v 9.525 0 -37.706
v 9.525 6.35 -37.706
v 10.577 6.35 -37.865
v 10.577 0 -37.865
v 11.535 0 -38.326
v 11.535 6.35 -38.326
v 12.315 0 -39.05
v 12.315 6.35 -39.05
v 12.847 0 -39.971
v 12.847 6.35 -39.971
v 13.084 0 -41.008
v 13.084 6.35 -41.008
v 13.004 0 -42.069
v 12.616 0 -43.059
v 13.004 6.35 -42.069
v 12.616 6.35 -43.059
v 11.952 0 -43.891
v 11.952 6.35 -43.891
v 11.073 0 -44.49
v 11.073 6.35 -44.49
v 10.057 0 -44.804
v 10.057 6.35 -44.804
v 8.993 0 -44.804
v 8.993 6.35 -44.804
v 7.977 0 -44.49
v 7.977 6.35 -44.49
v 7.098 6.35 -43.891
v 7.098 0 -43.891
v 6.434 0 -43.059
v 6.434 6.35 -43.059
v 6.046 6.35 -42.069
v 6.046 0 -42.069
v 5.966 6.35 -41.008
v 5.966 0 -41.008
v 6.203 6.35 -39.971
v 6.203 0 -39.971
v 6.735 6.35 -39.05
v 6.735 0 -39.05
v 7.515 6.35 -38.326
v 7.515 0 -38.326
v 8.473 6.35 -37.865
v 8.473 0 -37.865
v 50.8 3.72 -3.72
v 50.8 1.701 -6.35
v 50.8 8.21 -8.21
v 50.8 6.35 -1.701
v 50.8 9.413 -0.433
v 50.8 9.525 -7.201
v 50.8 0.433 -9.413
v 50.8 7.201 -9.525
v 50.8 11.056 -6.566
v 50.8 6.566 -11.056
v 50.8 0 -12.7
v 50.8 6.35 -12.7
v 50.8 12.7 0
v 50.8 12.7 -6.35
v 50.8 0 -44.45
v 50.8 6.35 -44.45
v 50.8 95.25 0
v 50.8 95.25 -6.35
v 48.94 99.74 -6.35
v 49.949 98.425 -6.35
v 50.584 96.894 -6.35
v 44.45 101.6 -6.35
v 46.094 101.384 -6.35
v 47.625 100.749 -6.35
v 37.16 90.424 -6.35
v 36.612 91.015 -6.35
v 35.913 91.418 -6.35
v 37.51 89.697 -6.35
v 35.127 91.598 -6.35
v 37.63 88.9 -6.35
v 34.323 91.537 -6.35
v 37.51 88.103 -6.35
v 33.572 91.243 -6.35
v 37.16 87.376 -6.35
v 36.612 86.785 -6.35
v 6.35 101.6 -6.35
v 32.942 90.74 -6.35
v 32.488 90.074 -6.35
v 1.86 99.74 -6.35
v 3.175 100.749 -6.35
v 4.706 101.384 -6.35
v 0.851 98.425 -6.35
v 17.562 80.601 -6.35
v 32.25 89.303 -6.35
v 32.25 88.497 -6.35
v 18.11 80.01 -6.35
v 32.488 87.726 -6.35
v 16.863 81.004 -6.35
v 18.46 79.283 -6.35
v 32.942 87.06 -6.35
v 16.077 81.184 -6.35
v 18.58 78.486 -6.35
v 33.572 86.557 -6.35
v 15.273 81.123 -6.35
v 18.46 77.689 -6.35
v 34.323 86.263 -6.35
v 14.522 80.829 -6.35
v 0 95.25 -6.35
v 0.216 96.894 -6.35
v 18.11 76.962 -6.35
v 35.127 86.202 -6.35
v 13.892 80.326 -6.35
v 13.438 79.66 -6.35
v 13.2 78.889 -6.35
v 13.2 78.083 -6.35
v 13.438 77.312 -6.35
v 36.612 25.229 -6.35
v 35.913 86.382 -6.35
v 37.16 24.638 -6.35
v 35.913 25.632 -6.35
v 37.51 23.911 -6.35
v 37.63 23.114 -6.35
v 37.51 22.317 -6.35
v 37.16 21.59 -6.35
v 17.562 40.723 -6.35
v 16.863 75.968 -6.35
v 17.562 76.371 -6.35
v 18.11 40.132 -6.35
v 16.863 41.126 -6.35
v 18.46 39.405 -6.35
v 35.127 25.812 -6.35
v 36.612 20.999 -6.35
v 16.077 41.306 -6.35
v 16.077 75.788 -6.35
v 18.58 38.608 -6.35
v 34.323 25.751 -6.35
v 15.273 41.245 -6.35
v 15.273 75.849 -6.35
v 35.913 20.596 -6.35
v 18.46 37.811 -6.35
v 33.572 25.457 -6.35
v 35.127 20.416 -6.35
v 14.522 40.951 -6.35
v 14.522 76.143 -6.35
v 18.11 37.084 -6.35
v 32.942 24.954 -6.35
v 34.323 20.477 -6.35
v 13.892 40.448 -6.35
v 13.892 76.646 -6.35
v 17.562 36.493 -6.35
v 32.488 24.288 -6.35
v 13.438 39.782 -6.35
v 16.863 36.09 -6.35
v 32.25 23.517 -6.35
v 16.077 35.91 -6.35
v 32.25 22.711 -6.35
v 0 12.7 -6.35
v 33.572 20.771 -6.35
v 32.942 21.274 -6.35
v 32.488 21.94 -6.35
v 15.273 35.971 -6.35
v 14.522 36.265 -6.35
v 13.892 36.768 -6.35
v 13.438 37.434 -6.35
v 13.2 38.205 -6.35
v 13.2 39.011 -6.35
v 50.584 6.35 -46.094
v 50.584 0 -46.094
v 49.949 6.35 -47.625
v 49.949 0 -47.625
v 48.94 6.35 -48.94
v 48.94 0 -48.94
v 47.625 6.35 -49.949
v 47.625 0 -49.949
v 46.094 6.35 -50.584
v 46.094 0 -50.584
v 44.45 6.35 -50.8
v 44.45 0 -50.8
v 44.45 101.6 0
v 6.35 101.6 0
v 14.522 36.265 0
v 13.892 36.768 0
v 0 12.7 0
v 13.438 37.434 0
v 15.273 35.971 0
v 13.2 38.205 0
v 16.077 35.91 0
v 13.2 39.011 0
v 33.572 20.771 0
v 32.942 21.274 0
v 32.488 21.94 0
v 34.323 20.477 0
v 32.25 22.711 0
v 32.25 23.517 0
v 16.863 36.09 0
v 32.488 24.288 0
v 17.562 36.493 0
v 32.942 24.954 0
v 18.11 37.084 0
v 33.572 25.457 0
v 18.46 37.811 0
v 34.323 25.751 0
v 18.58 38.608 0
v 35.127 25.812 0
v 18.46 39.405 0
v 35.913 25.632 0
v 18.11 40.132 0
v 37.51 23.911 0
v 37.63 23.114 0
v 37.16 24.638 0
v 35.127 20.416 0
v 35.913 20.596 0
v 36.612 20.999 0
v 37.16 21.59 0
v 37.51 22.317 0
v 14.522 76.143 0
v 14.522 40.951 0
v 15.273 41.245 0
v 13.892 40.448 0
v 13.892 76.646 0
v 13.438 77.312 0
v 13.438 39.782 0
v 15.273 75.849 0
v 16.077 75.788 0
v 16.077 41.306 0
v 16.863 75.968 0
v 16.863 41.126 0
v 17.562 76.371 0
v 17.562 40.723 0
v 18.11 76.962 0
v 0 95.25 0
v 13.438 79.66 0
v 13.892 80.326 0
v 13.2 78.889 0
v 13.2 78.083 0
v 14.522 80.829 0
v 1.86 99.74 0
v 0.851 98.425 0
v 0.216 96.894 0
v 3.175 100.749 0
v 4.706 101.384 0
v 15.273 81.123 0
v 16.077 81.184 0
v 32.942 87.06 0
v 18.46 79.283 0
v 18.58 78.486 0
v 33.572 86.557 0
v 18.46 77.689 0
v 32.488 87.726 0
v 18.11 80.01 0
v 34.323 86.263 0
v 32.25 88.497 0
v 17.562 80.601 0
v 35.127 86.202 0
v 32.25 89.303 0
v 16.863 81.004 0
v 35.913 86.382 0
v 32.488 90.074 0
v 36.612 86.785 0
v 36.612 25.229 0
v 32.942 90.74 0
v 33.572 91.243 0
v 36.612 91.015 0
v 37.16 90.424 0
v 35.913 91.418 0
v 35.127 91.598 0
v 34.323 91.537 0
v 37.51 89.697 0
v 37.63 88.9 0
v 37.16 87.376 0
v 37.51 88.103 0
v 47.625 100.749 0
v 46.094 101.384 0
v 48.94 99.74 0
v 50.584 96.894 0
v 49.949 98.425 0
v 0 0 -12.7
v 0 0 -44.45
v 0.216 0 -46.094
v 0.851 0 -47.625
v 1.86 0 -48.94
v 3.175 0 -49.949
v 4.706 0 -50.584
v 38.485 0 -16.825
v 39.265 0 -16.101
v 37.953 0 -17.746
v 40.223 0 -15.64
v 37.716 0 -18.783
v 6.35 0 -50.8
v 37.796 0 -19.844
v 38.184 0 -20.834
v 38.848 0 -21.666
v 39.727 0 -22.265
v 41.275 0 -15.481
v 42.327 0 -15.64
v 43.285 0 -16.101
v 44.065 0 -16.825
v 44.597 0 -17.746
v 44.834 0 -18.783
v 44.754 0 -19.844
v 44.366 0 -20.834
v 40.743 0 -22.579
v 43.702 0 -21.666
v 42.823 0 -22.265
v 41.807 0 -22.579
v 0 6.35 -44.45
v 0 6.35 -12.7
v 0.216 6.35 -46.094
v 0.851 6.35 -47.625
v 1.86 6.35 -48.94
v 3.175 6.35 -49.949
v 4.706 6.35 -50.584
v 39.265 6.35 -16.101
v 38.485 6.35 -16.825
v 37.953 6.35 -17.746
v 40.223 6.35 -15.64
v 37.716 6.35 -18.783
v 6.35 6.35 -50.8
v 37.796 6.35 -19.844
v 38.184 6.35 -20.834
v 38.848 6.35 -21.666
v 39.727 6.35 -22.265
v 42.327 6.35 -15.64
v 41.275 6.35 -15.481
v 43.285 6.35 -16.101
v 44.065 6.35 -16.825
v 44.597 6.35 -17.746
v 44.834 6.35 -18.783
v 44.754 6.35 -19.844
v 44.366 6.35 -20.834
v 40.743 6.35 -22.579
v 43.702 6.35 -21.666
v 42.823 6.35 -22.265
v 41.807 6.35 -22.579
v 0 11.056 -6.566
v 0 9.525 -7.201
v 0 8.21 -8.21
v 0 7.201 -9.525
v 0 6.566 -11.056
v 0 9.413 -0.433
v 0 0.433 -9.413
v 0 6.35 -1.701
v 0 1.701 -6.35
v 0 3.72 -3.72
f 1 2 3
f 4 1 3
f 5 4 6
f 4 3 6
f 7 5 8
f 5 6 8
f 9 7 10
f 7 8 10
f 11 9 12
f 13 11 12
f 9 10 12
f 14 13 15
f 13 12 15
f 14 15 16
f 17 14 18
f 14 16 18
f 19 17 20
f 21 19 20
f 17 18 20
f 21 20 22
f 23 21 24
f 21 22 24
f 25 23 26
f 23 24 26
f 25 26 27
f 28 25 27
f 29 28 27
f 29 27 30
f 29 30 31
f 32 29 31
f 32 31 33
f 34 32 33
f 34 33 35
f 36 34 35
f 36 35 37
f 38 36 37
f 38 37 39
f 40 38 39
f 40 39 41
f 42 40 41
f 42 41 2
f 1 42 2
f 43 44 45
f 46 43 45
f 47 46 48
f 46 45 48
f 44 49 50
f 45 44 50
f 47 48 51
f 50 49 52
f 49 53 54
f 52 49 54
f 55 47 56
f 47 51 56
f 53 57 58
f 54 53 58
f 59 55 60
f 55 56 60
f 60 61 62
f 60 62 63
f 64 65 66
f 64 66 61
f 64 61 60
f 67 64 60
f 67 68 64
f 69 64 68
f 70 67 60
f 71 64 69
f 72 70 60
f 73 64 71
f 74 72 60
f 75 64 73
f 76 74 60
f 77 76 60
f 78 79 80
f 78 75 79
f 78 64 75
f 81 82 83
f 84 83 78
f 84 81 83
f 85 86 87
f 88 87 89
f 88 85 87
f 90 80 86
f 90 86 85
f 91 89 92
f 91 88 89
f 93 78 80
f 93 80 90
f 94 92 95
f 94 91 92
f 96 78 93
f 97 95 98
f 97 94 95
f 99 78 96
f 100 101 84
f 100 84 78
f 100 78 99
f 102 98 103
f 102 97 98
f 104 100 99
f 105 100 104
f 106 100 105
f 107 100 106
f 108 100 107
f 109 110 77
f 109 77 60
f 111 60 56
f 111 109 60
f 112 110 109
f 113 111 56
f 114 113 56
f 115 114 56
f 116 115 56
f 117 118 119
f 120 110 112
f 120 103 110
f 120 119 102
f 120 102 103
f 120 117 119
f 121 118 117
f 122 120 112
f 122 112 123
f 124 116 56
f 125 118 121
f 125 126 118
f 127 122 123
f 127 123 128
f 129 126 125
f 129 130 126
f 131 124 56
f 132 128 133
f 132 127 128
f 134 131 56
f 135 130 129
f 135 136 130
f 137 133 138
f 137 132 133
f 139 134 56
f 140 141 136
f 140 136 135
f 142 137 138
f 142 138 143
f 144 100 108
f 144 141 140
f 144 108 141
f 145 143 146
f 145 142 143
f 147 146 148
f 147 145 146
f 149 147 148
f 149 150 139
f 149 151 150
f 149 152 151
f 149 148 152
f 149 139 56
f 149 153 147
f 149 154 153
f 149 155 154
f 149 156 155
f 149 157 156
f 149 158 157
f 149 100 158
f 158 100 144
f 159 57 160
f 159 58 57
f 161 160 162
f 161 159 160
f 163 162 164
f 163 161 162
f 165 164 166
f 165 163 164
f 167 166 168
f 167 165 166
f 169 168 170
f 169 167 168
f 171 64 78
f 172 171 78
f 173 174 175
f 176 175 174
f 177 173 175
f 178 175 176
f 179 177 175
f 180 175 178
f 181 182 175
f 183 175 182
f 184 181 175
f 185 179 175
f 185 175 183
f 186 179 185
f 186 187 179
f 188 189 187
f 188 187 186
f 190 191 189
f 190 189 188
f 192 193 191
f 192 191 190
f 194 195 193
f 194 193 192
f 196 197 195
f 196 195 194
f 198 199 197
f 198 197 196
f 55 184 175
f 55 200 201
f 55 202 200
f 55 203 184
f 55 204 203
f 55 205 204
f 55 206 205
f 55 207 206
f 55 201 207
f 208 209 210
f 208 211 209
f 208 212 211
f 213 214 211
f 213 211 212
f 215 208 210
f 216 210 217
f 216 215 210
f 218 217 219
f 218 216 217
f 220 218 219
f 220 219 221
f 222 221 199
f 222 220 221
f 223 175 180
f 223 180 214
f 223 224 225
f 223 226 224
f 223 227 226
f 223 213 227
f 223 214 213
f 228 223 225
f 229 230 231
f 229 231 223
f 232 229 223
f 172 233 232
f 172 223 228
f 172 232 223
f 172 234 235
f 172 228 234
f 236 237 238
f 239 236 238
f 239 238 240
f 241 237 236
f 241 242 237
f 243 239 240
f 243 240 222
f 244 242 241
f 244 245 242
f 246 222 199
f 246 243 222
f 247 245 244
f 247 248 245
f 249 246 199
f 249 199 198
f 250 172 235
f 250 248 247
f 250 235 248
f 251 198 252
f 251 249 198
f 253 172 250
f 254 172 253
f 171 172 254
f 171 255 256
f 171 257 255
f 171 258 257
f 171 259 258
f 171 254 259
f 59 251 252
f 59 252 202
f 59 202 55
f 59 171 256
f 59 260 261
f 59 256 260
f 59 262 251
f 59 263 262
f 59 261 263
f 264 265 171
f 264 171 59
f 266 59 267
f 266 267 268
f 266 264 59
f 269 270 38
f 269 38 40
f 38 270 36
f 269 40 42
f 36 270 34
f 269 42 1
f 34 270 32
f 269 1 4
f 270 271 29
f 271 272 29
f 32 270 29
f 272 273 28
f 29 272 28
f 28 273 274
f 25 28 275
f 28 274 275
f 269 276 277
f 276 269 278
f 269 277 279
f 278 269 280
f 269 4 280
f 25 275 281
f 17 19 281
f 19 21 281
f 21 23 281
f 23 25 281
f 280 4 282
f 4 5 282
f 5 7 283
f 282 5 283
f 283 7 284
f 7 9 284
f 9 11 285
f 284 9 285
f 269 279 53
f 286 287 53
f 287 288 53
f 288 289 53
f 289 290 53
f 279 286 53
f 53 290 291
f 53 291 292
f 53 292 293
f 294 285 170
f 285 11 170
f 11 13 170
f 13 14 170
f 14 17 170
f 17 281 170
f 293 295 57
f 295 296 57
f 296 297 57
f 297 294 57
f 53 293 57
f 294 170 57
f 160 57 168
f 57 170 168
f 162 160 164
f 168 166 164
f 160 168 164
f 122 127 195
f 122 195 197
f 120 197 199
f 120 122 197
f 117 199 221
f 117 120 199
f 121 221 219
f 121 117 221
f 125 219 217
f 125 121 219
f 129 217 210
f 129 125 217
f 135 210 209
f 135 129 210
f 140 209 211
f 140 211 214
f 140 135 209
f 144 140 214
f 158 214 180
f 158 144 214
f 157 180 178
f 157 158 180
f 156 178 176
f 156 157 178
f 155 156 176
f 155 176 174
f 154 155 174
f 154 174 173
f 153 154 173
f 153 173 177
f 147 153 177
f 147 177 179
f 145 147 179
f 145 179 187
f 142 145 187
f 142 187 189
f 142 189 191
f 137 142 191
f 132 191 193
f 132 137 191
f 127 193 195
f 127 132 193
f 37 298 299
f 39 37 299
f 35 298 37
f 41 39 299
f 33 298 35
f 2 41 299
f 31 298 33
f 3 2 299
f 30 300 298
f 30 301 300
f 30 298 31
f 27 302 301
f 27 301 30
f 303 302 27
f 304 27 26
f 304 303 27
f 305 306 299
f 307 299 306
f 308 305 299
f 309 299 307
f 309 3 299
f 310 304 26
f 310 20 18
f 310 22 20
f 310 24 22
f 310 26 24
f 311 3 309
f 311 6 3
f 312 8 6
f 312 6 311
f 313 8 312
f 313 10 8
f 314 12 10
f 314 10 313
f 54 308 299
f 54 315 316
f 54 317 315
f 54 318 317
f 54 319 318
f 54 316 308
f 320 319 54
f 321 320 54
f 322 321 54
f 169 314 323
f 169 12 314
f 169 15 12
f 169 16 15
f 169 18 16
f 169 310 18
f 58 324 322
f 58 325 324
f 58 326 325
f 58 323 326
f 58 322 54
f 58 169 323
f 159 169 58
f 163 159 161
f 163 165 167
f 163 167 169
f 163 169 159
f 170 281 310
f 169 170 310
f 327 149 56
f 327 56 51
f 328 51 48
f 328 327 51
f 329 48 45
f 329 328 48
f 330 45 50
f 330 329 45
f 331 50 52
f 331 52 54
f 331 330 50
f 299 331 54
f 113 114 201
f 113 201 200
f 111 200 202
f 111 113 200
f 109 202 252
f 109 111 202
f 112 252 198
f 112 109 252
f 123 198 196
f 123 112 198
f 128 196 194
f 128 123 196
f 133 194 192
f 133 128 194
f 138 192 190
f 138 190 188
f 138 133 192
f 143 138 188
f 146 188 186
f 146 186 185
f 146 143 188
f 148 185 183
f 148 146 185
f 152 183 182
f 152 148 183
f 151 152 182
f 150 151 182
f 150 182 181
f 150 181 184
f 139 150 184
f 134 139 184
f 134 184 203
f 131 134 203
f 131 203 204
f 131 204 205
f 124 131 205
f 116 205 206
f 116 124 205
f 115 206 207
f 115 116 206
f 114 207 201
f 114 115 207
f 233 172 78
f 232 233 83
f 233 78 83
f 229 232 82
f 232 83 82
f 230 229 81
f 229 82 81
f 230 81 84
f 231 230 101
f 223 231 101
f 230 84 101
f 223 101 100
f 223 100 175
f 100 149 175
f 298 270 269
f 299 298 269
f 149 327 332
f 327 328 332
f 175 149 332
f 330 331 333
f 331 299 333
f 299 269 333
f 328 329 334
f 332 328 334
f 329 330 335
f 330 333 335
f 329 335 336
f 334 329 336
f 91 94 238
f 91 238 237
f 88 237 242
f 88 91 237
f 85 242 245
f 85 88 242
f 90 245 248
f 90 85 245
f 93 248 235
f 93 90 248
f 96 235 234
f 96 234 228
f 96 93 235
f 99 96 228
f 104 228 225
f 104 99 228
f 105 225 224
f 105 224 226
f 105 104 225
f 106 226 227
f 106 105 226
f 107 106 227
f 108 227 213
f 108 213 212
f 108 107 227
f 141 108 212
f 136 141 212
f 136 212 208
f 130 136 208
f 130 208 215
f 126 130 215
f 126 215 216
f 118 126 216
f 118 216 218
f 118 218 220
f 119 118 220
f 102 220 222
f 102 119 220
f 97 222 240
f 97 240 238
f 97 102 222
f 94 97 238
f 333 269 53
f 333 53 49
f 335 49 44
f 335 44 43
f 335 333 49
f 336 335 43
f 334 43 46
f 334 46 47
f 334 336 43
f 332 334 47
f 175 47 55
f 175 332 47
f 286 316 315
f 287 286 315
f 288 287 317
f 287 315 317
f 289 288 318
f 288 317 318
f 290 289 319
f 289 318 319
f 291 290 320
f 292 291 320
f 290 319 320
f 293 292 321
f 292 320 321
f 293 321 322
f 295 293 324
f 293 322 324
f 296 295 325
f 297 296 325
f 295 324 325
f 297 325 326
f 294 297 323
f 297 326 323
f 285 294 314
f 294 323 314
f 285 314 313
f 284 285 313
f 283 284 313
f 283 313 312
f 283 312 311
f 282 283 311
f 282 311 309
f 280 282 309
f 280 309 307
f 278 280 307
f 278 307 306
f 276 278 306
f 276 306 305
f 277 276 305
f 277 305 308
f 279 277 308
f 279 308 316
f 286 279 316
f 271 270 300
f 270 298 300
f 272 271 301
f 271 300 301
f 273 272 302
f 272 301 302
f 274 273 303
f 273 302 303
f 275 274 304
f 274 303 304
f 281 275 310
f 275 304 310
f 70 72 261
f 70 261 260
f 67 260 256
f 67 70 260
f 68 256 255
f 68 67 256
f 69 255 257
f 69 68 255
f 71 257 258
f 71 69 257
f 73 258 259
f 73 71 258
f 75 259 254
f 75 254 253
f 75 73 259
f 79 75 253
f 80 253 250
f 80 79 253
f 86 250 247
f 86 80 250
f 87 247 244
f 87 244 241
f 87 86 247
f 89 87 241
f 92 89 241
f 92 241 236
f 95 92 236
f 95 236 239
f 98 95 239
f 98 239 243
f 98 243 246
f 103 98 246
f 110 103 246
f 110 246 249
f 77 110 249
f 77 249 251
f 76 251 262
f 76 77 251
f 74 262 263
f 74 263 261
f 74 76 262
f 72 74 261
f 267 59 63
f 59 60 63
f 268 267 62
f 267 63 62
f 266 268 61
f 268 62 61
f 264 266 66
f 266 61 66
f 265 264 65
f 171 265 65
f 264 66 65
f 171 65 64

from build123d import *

# Parameters (mm, degrees)
BASE_FLANGE1_DEPTH  = 50.8
SKETCH3_R           = 2.7051
TAB1_DEPTH          = 6.35
SKETCH3_2_R         = 2.7051
CUT_EXTRUDE1_DEPTH  = 12.7
SKETCH4_R           = 3.5687
CUT_EXTRUDE2_DEPTH  = 12.7
FILLET1_R           = 6.35
UNFOLD1_START       = 6.35
UNFOLD1_OUTLINE_W   = 50.8
UNFOLD1_OUTLINE_H   = 14.961835013
UNFOLD1_DEPTH       = 95.25
UNFOLD1_2_OUTLINE_R = 2.7051
UNFOLD1_2_DEPTH     = 6.35
FOLD1_START         = -1.304798
FOLD1_DEPTH         = 92.466633013
FOLD1_START_2       = -6.35
FOLD1_2_OUTLINE_R   = 2.7051
FOLD1_2_DEPTH       = 0.034797996
FOLD1_START_3       = -12.7
FOLD1_3_OUTLINE_R   = 2.7051
FOLD1_3_DEPTH       = 12.7
FOLD1_4_DEPTH       = 50.8


with BuildPart() as part:
    # Base-Flange1: sheet metal written as solids
    # Sketch1 → Base-Flange1 (new body)
    with BuildSketch(Plane(origin=(0, 0, 0), x_dir=(0, 0, -1), z_dir=(1, 0, 0))):
        with BuildLine():
            Line((0, 101.6), (0, 12.7))
            ThreePointArc((0, 12.7), (3.719743879, 3.719743879), (12.7, 0))
            Line((12.7, 0), (50.8, 0))
            Line((50.8, 0), (50.8, 6.35))
            Line((50.8, 6.35), (12.7, 6.35))
            ThreePointArc((12.7, 6.35), (8.209871939, 8.209871939), (6.35, 12.7))
            Line((6.35, 12.7), (6.35, 101.6))
            Line((6.35, 101.6), (0, 101.6))
        make_face()
    extrude(amount=BASE_FLANGE1_DEPTH)

    # Tab1: sheet metal written as solids
    # Sketch3 → Tab1 (add)
    with BuildSketch(Plane(origin=(0, 0, -6.35), x_dir=(-1, 0, 0), z_dir=(0, 0, -1))):
        with Locations((-34.925, 23.114)):
            Circle(SKETCH3_R)
        with Locations((-34.925, 88.9)):
            Circle(SKETCH3_R)
        with Locations((-15.875, 38.608)):
            Circle(SKETCH3_R)
        with Locations((-15.875, 78.486)):
            Circle(SKETCH3_R)
    extrude(amount=-TAB1_DEPTH)

    # Sketch3<2> → Cut-Extrude1 (cut)
    with BuildSketch(Plane(origin=(0, 0, -6.35), x_dir=(-1, 0, 0), z_dir=(0, 0, -1))):
        with Locations(Location((-34.925, 23.114, 0), (0, 0, 90))):
            Circle(SKETCH3_2_R)
        with Locations(Location((-34.925, 88.9, 0), (0, 0, 90))):
            Circle(SKETCH3_2_R)
        with Locations(Location((-15.875, 38.608, 0), (0, 0, 90))):
            Circle(SKETCH3_2_R)
        with Locations(Location((-15.875, 78.486, 0), (0, 0, 90))):
            Circle(SKETCH3_2_R)
    extrude(amount=-CUT_EXTRUDE1_DEPTH, mode=Mode.SUBTRACT)

    # Sketch4 → Cut-Extrude2 (cut)
    with BuildSketch(Plane(origin=(0, 6.35, 0), x_dir=(-1, 0, 0), z_dir=(0, 1, 0))):
        with Locations(Location((-41.275, -19.05, 0), (0, 0, 90))):
            Circle(SKETCH4_R)
        with Locations(Location((-9.525, -41.275, 0), (0, 0, 90))):
            Circle(SKETCH4_R)
    extrude(amount=-CUT_EXTRUDE2_DEPTH, mode=Mode.SUBTRACT)

    # Fillet1
    fillet1_edges = [part.edges().sort_by_distance(p)[0] for p in [
        (50.8, 101.6, -3.175),
        (0, 101.6, -3.175),
        (50.8, 3.175, -50.8),
        (0, 3.175, -50.8),
    ]]
    fillet(fillet1_edges, radius=FILLET1_R)

    # Unfold1: read off the stored shape, not the designer's step
    # Unfold1 outline → Unfold1 (cut)
    with BuildSketch(Plane(origin=(0, 0, 0), x_dir=(1, 0, 0), z_dir=(0, 1, 0)).offset(UNFOLD1_START)):
        with Locations((25.4, 5.219082494)):
            Rectangle(UNFOLD1_OUTLINE_W, UNFOLD1_OUTLINE_H)
    extrude(amount=UNFOLD1_DEPTH, mode=Mode.SUBTRACT)

    # Unfold1 2 outline → Unfold1 2 (add)
    with BuildSketch(Plane(origin=(0, 0, 0), x_dir=(1, 0, 0), z_dir=(0, 1, 0))):
        with BuildLine():
            ThreePointArc((0, -84.811835013), (1.859871939, -89.301963073), (6.35, -91.161835013))
            Line((6.35, -91.161835013), (44.45, -91.161835013))
            ThreePointArc((44.45, -91.161835013), (48.940128061, -89.301963073), (50.8, -84.811835013))
            Line((50.8, -84.811835013), (50.8, 12.7))
            Line((50.8, 12.7), (0, 12.7))
            Line((0, 12.7), (0, -84.811835013))
        make_face()
        with Locations((15.875, -68.047835013)):
            Circle(UNFOLD1_2_OUTLINE_R, mode=Mode.SUBTRACT)
        with Locations((34.925, -78.461835013)):
            Circle(UNFOLD1_2_OUTLINE_R, mode=Mode.SUBTRACT)
        with Locations((15.875, -28.169835013)):
            Circle(UNFOLD1_2_OUTLINE_R, mode=Mode.SUBTRACT)
        with Locations((34.925, -12.675835013)):
            Circle(UNFOLD1_2_OUTLINE_R, mode=Mode.SUBTRACT)
    extrude(amount=UNFOLD1_2_DEPTH)

    # Fold1: read off the stored shape, not the designer's step
    # Fold1 outline → Fold1 (cut)
    with BuildSketch(Plane.XY.offset(FOLD1_START)):
        Polygon((50.8, 0), (50.8, 6.35), (0, 6.35), (0, 9e-09), align=None)
    extrude(amount=FOLD1_DEPTH, mode=Mode.SUBTRACT)

    # Fold1 2 outline → Fold1 2 (add)
    with BuildSketch(Plane.XY.offset(FOLD1_START_2)):
        with BuildLine():
            Line((50.8, 6.35), (50.8, 95.25))
            ThreePointArc((50.8, 95.25), (48.940128061, 99.740128061), (44.45, 101.6))
            Line((44.45, 101.6), (6.35, 101.6))
            ThreePointArc((6.35, 101.6), (1.859871939, 99.740128061), (0, 95.25))
            Line((0, 95.25), (0, 6.35))
            Line((0, 6.35), (50.8, 6.35))
        make_face()
        with Locations((15.875, 38.608)):
            Circle(FOLD1_2_OUTLINE_R, mode=Mode.SUBTRACT)
        with Locations((34.925, 23.114)):
            Circle(FOLD1_2_OUTLINE_R, mode=Mode.SUBTRACT)
        with Locations((15.875, 78.486)):
            Circle(FOLD1_2_OUTLINE_R, mode=Mode.SUBTRACT)
        with Locations((34.925, 88.9)):
            Circle(FOLD1_2_OUTLINE_R, mode=Mode.SUBTRACT)
    extrude(amount=FOLD1_2_DEPTH)

    # Fold1 3 outline → Fold1 3 (add)
    with BuildSketch(Plane.XY.offset(FOLD1_START_3)):
        with BuildLine():
            Line((50.8, 6.35), (50.8, 95.25))
            ThreePointArc((50.8, 95.25), (48.940128061, 99.740128061), (44.45, 101.6))
            Line((44.45, 101.6), (6.35, 101.6))
            ThreePointArc((6.35, 101.6), (1.859871939, 99.740128061), (0, 95.25))
            Line((0, 95.25), (0, 6.35))
            Line((0, 6.35), (50.8, 6.35))
        make_face()
        with Locations((15.875, 38.608)):
            Circle(FOLD1_3_OUTLINE_R, mode=Mode.SUBTRACT)
        with Locations((34.925, 23.114)):
            Circle(FOLD1_3_OUTLINE_R, mode=Mode.SUBTRACT)
        with Locations((15.875, 78.486)):
            Circle(FOLD1_3_OUTLINE_R, mode=Mode.SUBTRACT)
        with Locations((34.925, 88.9)):
            Circle(FOLD1_3_OUTLINE_R, mode=Mode.SUBTRACT)
    extrude(amount=FOLD1_3_DEPTH)

    # Fold1 4 outline → Fold1 4 (cut)
    with BuildSketch(Plane.YZ):
        with BuildLine():
            ThreePointArc((9e-09, -12.7), (3.719743885, -3.719743885), (12.7, -9e-09))
            Line((12.7, -9e-09), (6.35, 0))
            Line((6.35, 0), (6.35, -1.304798))
            Line((6.35, -1.304798), (0, -1.304798))
            Line((0, -1.304798), (9e-09, -12.7))
        make_face()
        with BuildLine():
            Line((101.6, -6.35), (12.7, -6.350000009))
            ThreePointArc((12.7, -6.350000009), (8.209871946, -8.209871946), (6.350000009, -12.7))
            Line((6.350000009, -12.7), (101.6, -12.7))
            Line((101.6, -12.7), (101.6, -6.35))
        make_face()
    extrude(amount=FOLD1_4_DEPTH, mode=Mode.SUBTRACT)


solid = part.part
